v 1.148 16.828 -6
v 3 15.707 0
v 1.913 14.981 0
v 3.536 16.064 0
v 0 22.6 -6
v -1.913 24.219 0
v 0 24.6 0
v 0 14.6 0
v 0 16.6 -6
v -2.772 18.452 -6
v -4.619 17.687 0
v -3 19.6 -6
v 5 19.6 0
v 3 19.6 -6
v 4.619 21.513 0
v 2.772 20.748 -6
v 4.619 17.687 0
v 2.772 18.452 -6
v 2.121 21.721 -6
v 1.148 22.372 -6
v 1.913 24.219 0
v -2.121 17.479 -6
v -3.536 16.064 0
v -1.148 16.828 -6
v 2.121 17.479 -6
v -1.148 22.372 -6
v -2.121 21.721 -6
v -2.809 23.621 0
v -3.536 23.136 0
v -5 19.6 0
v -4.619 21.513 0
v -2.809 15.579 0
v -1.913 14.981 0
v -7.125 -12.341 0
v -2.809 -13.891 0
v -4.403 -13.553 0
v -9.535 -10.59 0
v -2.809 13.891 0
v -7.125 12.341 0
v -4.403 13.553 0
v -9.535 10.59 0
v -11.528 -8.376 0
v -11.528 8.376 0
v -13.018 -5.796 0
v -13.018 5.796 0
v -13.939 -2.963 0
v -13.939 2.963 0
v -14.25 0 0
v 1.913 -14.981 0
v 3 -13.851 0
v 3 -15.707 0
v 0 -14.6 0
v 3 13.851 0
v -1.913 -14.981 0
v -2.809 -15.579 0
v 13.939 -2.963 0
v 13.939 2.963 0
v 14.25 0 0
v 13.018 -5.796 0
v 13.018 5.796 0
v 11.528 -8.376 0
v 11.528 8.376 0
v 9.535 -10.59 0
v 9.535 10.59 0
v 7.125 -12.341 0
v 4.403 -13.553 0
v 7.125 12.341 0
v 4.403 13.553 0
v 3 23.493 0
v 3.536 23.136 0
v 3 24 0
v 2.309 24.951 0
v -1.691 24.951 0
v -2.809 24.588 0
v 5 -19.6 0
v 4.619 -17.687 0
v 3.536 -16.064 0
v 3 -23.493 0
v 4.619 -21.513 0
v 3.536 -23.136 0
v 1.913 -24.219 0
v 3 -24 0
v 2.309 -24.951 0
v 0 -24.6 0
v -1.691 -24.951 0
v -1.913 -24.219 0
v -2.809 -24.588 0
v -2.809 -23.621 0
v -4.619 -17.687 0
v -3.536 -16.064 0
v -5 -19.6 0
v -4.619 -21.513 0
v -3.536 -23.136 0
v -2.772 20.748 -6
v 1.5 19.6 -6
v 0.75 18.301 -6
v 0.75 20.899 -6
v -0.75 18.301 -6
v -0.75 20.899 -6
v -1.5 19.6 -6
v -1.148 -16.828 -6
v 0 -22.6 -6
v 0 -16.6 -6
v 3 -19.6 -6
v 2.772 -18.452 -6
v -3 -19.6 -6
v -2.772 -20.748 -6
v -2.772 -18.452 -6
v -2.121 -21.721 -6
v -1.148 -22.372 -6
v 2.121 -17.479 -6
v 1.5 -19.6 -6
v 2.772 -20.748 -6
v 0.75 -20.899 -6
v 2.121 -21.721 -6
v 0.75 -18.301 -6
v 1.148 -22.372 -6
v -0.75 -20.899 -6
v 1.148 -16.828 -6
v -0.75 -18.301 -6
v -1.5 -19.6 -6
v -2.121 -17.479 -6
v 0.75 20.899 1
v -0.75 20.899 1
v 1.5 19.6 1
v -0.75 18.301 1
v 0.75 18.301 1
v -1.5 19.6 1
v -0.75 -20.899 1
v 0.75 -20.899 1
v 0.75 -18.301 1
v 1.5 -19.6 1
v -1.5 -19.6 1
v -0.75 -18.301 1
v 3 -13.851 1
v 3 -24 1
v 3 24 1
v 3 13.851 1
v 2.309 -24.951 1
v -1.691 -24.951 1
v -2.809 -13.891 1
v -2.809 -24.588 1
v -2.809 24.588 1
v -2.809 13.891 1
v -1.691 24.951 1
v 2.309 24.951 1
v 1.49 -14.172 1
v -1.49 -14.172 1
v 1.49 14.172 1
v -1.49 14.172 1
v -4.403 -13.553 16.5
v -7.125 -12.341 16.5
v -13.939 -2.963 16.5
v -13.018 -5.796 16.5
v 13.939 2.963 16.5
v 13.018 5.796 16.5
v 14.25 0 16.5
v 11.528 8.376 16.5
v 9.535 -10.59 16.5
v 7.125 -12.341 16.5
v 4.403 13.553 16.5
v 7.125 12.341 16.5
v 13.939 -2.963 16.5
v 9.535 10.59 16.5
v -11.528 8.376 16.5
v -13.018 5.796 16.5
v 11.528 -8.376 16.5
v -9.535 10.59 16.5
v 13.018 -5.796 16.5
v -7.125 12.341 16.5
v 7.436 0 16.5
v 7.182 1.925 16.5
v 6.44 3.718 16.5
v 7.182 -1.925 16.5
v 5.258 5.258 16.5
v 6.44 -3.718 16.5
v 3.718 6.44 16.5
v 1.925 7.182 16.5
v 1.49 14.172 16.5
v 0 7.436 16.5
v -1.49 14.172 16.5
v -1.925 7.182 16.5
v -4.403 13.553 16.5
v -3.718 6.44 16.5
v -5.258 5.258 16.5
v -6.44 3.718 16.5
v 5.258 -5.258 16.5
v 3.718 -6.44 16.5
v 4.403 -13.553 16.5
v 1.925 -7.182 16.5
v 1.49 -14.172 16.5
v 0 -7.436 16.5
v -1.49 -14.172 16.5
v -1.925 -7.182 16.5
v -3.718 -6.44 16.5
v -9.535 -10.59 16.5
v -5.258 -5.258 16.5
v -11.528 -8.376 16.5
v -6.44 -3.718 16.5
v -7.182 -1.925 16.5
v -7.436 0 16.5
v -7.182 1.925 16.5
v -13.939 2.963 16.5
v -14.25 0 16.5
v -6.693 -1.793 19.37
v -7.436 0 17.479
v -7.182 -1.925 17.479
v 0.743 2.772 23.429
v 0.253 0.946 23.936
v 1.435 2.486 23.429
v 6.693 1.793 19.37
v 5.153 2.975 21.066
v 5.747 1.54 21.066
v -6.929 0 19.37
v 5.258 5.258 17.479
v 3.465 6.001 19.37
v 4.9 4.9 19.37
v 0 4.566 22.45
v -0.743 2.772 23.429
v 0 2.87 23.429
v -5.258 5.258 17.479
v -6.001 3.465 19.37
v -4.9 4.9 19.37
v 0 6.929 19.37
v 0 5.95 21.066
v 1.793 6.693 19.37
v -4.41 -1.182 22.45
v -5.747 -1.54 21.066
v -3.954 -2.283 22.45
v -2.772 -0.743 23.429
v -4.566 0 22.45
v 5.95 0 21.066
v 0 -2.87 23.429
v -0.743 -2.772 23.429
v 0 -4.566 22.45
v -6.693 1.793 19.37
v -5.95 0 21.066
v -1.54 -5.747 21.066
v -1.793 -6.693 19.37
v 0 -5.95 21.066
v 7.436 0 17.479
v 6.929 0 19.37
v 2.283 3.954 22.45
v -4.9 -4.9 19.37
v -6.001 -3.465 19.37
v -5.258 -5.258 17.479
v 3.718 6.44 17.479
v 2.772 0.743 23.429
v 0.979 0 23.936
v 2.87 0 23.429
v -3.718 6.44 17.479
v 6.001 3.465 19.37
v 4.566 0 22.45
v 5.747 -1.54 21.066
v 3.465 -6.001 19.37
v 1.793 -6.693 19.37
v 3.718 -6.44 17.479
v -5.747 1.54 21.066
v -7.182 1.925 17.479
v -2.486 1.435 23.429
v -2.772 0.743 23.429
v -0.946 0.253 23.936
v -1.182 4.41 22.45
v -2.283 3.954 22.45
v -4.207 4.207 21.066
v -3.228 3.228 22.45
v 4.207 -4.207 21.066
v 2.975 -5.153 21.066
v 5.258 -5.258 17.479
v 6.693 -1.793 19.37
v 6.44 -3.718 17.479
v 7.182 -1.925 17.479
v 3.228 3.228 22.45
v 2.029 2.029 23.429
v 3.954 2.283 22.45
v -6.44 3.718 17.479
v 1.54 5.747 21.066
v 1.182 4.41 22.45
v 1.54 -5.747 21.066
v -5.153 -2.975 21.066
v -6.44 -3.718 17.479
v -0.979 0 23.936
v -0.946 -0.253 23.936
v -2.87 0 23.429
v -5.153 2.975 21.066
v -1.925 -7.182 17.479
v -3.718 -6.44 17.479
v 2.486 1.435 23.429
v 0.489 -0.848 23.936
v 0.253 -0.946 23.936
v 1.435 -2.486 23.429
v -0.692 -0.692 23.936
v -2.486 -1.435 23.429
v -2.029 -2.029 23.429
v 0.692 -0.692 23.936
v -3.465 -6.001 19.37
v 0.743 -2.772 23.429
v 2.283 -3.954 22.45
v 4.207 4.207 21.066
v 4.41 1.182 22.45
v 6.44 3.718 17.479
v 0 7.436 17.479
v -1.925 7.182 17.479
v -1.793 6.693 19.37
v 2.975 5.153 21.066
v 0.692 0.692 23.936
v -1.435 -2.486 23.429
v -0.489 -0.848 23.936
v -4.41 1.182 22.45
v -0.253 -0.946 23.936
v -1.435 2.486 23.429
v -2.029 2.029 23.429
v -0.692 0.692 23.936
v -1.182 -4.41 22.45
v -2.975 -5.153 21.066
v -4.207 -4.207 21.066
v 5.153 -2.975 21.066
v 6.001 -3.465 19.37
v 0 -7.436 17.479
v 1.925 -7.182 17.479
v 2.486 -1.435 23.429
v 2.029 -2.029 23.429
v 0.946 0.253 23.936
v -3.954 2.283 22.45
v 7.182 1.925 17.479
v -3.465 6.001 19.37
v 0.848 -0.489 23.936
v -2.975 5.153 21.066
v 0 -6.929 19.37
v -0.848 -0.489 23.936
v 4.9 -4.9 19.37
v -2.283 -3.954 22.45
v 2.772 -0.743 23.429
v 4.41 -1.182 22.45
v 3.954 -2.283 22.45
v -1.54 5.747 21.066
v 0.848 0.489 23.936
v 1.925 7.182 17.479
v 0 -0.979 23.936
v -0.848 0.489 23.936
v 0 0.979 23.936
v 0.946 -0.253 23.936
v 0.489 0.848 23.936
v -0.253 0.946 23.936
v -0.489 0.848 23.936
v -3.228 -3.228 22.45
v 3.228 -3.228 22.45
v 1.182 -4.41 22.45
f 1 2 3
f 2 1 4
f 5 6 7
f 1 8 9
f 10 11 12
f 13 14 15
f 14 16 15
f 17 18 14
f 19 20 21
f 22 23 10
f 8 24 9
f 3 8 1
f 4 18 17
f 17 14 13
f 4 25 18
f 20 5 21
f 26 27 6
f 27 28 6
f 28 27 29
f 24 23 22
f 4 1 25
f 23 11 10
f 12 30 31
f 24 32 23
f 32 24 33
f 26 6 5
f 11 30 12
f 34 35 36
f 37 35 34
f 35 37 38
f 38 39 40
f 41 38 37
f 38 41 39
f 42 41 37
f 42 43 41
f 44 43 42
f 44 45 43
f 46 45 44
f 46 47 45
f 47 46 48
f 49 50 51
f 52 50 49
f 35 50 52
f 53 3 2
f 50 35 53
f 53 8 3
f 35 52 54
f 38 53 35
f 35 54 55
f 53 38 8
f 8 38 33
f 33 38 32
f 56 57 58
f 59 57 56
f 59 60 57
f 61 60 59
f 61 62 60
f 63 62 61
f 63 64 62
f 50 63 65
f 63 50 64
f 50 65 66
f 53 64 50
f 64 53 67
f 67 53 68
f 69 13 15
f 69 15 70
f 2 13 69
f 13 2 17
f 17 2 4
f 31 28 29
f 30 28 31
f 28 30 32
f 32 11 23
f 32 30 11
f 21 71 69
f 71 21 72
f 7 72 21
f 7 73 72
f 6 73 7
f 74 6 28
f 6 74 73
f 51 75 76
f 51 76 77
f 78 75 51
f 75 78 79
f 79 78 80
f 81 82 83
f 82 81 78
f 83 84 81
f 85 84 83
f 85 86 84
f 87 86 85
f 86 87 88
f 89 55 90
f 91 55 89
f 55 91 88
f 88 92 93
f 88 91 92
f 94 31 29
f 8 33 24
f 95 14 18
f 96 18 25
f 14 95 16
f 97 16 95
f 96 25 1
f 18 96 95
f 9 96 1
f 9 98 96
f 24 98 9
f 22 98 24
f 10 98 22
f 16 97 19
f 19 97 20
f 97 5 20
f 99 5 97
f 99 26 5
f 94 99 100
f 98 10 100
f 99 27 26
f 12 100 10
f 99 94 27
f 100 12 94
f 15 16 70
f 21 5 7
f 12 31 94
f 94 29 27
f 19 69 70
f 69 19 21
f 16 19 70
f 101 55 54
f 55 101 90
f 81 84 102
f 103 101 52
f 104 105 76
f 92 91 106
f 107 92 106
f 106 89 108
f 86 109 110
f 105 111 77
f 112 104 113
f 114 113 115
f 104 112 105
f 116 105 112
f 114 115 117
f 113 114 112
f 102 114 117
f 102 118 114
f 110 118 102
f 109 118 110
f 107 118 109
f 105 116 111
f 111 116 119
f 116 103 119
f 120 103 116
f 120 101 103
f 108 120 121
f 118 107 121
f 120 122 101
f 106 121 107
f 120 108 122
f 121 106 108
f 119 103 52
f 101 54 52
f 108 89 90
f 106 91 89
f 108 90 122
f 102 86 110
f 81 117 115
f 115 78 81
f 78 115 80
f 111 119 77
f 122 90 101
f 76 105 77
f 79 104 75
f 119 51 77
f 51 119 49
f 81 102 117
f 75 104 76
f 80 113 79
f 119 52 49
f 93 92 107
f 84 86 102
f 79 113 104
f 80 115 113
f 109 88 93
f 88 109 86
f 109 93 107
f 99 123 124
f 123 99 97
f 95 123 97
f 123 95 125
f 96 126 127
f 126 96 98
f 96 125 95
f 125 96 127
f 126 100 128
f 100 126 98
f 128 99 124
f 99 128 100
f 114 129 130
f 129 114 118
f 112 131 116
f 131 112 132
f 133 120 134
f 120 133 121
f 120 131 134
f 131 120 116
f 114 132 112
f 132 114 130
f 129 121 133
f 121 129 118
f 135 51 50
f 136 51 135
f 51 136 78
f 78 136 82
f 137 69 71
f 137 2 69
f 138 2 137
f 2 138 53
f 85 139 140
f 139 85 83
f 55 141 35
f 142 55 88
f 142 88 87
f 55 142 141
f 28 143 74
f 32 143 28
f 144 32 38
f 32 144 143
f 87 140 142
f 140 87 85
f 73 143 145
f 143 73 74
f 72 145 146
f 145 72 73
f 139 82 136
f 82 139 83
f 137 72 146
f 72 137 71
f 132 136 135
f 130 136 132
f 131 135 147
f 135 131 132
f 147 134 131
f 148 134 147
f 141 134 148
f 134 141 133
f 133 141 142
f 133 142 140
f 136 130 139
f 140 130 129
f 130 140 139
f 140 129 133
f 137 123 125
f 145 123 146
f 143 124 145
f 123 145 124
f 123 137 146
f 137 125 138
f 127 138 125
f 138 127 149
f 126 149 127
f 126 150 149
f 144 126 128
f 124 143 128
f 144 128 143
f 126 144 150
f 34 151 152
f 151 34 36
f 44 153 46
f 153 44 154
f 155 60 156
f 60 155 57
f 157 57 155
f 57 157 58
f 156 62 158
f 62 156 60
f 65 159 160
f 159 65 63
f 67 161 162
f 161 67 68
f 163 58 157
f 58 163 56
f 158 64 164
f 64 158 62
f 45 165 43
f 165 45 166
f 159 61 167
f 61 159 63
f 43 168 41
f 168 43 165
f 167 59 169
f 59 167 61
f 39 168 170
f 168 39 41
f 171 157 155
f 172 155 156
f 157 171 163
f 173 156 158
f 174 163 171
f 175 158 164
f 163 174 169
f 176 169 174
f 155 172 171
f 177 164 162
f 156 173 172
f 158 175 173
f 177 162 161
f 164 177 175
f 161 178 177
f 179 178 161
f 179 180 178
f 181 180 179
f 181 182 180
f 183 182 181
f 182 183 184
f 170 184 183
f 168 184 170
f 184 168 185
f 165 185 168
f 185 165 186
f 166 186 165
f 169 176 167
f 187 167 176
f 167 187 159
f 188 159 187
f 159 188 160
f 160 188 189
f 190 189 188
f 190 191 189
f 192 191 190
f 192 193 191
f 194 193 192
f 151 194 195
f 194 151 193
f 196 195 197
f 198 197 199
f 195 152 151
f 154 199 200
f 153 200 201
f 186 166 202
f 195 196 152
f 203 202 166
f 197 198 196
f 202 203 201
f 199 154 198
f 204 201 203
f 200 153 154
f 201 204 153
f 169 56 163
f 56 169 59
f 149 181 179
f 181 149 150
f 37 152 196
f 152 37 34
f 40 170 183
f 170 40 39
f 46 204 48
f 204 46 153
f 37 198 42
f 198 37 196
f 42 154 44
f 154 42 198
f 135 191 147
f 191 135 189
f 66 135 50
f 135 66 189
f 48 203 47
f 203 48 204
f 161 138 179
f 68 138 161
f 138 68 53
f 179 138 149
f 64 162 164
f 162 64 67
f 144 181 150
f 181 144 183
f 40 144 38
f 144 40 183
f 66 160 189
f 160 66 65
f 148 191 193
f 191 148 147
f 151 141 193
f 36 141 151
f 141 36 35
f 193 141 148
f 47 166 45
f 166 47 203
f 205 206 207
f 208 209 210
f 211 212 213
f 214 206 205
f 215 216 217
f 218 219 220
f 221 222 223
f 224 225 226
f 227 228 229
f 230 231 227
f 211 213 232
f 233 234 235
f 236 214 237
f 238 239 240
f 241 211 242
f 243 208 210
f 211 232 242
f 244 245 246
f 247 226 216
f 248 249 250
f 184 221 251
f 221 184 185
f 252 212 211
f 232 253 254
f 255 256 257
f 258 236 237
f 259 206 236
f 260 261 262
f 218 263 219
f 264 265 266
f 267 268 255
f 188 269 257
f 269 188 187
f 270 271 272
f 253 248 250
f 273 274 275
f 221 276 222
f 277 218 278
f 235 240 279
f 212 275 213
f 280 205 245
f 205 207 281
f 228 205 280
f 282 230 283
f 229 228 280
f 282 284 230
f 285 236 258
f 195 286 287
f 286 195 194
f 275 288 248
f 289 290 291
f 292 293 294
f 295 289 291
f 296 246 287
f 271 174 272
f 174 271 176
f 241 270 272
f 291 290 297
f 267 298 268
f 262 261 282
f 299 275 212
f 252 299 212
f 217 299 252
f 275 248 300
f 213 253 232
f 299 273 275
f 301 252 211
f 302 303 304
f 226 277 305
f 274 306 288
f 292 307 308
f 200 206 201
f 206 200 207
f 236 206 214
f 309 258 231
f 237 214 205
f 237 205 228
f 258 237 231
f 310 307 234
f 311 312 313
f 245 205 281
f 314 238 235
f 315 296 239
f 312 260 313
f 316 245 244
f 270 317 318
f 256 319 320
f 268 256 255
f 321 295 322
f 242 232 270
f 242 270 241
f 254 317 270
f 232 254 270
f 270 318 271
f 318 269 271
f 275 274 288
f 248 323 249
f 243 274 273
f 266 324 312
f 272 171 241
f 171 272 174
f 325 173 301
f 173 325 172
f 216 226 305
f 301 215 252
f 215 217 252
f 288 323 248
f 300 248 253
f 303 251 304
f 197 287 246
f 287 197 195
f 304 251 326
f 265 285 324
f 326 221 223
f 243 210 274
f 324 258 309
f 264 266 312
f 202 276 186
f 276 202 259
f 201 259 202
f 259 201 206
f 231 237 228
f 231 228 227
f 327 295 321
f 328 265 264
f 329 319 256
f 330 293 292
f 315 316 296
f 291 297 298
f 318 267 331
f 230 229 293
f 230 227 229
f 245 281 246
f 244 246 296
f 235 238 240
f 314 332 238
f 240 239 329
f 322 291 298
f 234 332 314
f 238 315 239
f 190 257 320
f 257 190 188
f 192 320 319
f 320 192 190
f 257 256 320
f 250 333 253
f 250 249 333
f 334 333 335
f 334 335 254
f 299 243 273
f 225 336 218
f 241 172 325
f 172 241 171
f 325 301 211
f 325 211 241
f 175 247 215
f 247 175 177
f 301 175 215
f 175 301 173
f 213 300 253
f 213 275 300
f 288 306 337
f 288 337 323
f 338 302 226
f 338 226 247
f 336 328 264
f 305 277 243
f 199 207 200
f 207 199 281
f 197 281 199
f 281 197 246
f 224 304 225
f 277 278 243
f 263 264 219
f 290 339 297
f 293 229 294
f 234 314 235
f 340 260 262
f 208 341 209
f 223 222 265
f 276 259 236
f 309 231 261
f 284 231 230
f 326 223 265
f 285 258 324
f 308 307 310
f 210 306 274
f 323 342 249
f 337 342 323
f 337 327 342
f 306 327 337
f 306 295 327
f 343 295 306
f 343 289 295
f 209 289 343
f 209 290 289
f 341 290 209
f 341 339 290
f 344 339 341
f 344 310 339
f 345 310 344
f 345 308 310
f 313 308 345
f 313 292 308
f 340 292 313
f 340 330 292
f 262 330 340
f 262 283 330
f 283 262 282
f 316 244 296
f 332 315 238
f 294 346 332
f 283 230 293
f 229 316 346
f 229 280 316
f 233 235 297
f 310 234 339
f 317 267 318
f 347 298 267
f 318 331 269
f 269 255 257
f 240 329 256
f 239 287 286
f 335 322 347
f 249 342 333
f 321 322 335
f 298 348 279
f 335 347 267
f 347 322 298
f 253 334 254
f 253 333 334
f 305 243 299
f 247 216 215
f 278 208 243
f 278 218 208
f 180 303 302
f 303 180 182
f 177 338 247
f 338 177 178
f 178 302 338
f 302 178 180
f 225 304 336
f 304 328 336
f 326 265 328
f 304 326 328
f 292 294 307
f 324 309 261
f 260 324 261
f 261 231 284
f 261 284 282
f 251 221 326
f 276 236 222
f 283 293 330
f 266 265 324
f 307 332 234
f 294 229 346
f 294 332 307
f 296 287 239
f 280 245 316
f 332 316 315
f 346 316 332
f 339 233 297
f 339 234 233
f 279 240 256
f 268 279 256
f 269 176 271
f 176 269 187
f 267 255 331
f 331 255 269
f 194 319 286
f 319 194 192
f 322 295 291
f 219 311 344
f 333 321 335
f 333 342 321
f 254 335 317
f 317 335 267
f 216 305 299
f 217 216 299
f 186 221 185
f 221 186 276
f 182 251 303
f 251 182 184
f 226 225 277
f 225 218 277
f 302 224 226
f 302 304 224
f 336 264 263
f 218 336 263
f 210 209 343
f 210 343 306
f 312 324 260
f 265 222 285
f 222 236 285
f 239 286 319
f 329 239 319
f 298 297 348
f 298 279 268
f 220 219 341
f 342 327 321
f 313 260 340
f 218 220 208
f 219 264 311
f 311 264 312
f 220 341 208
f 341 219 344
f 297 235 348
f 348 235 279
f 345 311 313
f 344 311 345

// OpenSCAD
// file: M3.scad
module M3_hole( pos=[0, 0, 0], depth = 10, invert=false) {
    color("cyan")
    translate( pos)
    if( invert) {
        rotate([180, 0, 0])
        cylinder(r1=1.5, r2=1.5, depth, center=false, $fn=6);
    }
    else {
        cylinder(r1=1.5, r2=1.5, depth, center=false, $fn=6);
    }
}

M3_hole();
// file: roundbox.scad
module roundedRectUp(size, radius)
{
    x = size[0];
    y = size[1];
    z = size[2];

    linear_extrude(height=z)
    hull()
    {
        // place 4 circles in the corners, with the given radius
        translate([(-x/2)+(radius/2), (-y/2)+(radius/2), 0])
        circle(r=radius);

        translate([(x/2)-(radius/2), (-y/2)+(radius/2), 0])
        circle(r=radius);

        translate([(-x/2)+(radius/2), (y/2)-(radius/2), 0])
        circle(r=radius);

        translate([(x/2)-(radius/2), (y/2)-(radius/2), 0])
        circle(r=radius);
    }
}

module roundedRect(size, radius, center=false) 
{
    if( center) {
        translate([ 0, 0, -size[2]/2])
        roundedRectUp(size, radius);
    }
    else {
        roundedRectUp(size, radius);
    }
}


// example
roundedRect([20, 10, 1], 3, true);
// main file
use <roundbox.scad>
use <M3.scad>


module bille_screw( pos, mat=false, hole=false) {
    if( mat) {
        translate([0, 0, -6])
        translate(pos)
        cylinder(r1=3, r2=5, h=6, center=false);
    }

    if( hole) {
        // screw
        h = 10;
        translate([0, 0, 2]) 
        M3_hole(pos, h, invert=true);
    }
}

module bille_equip() {
    h = 16.5;
   roundedRect([ 5, 49, 1], 1);

    cylinder(r=28.5/2, h=h, center=false);

    translate([0, 0, h])    
    sphere(15/2,center = true);
}

module bille_impl( mat=false, hole=false, equip=false) {
    d= 39.2/2;
    screw_pos=[0, d, 0];
    bille_screw(screw_pos, mat=mat, hole=hole);    
    rotate([0, 0, 180])
    bille_screw(screw_pos, mat=mat, hole=hole);
    

}

module bille( mat=false, hole=false, equip=false) {
    bille_impl( mat=mat, hole=hole, equip=equip);
    
    if( equip) {
        difference() {
        color("silver")
        bille_equip(mat=true);
        bille_impl(hole=true);
        }
     } 
}

difference() {
bille(mat=true);
bille(hole=true);
}

bille(equip=true,hole=false);
